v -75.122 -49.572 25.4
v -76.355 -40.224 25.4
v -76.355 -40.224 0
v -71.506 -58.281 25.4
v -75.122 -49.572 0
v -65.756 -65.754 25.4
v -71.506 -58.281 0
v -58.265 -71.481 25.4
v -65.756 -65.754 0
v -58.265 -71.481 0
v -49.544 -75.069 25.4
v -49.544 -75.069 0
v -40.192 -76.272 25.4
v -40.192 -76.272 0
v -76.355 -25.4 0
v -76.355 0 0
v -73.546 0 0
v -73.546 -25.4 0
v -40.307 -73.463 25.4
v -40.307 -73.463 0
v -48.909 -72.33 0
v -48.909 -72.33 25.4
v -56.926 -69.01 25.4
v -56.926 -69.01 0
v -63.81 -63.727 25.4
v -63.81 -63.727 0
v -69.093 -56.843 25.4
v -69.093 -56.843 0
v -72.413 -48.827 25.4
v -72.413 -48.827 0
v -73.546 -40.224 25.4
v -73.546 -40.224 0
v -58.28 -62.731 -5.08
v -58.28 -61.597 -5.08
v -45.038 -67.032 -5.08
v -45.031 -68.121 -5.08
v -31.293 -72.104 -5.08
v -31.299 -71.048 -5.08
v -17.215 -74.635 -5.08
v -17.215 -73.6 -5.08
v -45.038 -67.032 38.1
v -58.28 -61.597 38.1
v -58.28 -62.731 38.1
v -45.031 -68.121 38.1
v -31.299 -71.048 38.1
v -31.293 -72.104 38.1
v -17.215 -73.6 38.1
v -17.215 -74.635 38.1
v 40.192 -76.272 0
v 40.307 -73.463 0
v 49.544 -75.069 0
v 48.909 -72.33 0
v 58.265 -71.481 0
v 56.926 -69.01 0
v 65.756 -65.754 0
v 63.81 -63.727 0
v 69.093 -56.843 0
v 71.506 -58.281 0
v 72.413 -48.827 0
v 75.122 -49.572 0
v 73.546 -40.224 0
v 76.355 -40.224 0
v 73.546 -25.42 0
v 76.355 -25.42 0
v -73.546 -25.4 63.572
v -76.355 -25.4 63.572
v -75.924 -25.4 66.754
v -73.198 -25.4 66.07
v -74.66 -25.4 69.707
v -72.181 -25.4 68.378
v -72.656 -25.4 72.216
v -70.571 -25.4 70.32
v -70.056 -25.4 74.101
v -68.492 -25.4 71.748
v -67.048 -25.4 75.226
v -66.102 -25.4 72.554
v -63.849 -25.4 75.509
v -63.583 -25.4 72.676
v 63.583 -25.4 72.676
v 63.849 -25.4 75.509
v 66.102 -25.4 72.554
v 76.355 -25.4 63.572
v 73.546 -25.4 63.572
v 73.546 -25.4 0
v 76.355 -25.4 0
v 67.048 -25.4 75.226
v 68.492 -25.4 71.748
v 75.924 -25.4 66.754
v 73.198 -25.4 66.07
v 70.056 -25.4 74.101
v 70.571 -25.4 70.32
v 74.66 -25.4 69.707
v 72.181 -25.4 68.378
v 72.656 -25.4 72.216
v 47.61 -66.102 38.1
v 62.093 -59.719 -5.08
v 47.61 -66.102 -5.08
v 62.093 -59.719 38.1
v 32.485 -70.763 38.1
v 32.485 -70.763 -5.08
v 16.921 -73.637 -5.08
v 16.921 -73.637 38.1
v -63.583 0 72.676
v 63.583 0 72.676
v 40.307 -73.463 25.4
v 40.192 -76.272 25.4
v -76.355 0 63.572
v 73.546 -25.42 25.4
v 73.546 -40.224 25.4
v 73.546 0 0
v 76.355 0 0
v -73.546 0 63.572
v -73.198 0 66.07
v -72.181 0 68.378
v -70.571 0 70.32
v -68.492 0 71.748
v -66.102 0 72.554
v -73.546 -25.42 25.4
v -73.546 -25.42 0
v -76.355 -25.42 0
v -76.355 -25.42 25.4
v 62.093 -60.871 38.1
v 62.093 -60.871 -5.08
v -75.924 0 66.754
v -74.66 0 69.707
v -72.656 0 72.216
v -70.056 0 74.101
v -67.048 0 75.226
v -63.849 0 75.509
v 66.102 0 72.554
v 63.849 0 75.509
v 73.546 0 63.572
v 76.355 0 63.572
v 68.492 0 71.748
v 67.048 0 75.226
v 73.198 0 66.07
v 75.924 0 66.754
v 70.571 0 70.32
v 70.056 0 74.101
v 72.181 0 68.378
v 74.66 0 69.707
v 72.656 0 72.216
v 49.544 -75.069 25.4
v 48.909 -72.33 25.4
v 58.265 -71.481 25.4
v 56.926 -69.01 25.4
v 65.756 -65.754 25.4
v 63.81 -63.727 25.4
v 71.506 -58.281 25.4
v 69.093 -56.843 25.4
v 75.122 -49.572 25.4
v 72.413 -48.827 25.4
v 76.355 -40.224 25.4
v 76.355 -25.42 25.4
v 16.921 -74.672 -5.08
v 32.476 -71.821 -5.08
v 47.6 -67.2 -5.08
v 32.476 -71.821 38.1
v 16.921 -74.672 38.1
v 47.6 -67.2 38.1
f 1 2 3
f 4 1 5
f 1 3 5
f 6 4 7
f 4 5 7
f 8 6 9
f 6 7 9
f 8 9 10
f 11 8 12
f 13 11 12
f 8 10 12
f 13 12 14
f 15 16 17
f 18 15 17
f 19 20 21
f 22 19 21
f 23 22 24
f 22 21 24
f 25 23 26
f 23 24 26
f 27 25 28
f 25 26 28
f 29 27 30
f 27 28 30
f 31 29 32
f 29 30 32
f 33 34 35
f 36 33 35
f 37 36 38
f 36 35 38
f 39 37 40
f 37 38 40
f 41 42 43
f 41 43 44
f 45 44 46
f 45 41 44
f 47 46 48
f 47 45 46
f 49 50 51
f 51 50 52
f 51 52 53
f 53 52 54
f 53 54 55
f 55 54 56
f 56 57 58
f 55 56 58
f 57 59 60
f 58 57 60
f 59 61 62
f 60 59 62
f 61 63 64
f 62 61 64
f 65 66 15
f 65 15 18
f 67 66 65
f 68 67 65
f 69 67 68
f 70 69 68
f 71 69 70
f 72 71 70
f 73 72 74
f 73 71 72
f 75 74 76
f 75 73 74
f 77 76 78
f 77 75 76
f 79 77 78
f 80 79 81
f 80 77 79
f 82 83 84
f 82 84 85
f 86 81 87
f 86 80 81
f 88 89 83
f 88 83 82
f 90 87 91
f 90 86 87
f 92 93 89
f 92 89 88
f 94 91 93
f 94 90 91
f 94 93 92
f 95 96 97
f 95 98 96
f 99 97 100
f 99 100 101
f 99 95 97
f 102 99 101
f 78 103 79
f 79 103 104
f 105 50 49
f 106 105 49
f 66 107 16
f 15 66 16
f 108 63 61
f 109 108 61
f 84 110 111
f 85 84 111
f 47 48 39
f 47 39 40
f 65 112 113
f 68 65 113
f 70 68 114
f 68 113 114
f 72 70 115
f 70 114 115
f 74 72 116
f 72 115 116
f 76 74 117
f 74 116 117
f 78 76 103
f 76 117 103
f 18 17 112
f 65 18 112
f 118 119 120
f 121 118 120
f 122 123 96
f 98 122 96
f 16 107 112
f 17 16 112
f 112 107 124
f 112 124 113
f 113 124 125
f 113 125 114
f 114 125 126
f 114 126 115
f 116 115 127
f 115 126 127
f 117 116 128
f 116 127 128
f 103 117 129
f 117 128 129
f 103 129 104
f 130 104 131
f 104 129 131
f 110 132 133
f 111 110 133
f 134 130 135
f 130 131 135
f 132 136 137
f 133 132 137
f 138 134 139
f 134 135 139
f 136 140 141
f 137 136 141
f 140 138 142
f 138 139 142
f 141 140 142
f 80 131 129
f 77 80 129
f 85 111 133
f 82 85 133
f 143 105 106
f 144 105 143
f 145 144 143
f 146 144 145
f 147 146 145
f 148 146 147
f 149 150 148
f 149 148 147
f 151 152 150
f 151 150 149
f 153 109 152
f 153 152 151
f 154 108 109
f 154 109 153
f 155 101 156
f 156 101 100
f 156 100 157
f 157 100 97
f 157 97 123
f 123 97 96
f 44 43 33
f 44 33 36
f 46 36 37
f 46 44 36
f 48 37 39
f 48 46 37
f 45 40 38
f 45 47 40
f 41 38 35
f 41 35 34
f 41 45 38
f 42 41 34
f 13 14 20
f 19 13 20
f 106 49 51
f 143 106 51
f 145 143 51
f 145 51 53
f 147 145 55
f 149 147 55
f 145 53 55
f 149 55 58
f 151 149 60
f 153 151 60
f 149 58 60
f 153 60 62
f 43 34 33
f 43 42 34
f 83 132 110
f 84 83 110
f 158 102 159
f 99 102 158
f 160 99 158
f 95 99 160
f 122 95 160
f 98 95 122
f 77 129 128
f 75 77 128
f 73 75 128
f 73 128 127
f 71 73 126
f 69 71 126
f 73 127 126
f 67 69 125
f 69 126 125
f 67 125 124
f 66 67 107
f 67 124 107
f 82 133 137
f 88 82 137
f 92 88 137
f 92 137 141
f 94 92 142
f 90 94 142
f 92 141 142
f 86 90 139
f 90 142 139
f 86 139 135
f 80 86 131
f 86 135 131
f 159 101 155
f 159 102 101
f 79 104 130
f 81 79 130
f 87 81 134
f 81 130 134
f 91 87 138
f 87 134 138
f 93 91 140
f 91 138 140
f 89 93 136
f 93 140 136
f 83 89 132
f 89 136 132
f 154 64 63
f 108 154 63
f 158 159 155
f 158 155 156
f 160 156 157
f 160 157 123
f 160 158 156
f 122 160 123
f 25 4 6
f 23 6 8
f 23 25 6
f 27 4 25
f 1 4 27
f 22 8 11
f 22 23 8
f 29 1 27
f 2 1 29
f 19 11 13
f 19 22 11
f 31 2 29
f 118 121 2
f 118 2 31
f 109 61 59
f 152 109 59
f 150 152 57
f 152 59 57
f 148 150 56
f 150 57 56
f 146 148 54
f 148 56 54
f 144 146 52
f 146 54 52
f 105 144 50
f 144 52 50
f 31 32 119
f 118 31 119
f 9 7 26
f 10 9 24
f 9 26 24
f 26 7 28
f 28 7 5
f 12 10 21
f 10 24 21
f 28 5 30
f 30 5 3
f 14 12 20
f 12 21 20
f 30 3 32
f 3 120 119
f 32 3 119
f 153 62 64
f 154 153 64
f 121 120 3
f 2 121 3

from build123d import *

# Parameters (mm, degrees)
F2_DEPTH      = 25.4
F3_DEPTH      = 25.4
F5_DEPTH      = 38.1
F5_DEPTH_BACK = 5.08


with BuildPart() as f2:
    # F0 (on Front) → F2 (new body)
    with BuildSketch(Plane.XZ):
        with BuildLine():
            Line((-76.355159, 63.57199), (-76.355159, 0))
            Line((-76.355159, 0), (-73.545843, 0))
            Line((-73.545843, 0), (-73.545843, 63.57199))
            ThreePointArc((-73.545843, 63.57199), (-70.571152, 70.319842), (-63.58318, 72.675802))
            Line((-63.58318, 72.675802), (63.58318, 72.675802))
            ThreePointArc((63.58318, 72.675802), (70.571152, 70.319842), (73.545843, 63.57199))
            Line((73.545843, 63.57199), (73.545843, 0))
            Line((73.545843, 0), (76.355159, 0))
            Line((76.355159, 0), (76.355159, 63.57199))
            ThreePointArc((76.355159, 63.57199), (72.656299, 72.216194), (63.849493, 75.509218))
            Line((63.849493, 75.509218), (-63.849493, 75.509218))
            ThreePointArc((-63.849493, 75.509218), (-72.656299, 72.216194), (-76.355159, 63.57199))
        make_face()
    extrude(amount=F2_DEPTH)


with BuildPart() as f3:
    # F1 (on Top) → F3 (new body)
    with BuildSketch(Plane.XY):
        with BuildLine():
            Line((76.355159, -25.419576), (73.545843, -25.419576))
            Line((73.545843, -25.419576), (73.545843, -40.22374))
            ThreePointArc((73.545843, -40.22374), (63.810273, -63.727486), (40.306527, -73.463056))
            Line((40.306527, -73.463056), (40.192119, -76.272191))
            ThreePointArc((40.192119, -76.272191), (65.756278, -65.75439), (76.355159, -40.22374))
            Line((76.355159, -40.22374), (76.355159, -25.419576))
        make_face()
        with BuildLine():
            Line((-73.545843, -25.419576), (-76.355159, -25.419576))
            Line((-76.355159, -25.419576), (-76.355159, -40.22374))
            ThreePointArc((-76.355159, -40.22374), (-65.756278, -65.75439), (-40.192119, -76.272191))
            Line((-40.192119, -76.272191), (-40.306527, -73.463056))
            ThreePointArc((-40.306527, -73.463056), (-63.810273, -63.727486), (-73.545843, -40.22374))
            Line((-73.545843, -40.22374), (-73.545843, -25.419576))
        make_face()
    extrude(amount=F3_DEPTH)


with BuildPart() as f5:
    # F4 (on Top) → F5 (new body, two sides)
    with BuildSketch(Plane.XY) as f5_sk:
        with BuildLine():
            Line((16.920835, -73.637406), (16.920835, -74.671656))
            ThreePointArc((16.920835, -74.671656), (40.104947, -69.728819), (62.092822, -60.870601))
            Line((62.092822, -60.870601), (62.092822, -59.718692))
            ThreePointArc((62.092822, -59.718692), (40.115111, -68.652178), (16.920835, -73.637406))
        make_face()
        with BuildLine():
            Line((-58.280259, -61.596542), (-58.280259, -62.731045))
            ThreePointArc((-58.280259, -62.731045), (-38.213891, -70.291751), (-17.214814, -74.634814))
            Line((-17.214814, -74.634814), (-17.214814, -73.600281))
            ThreePointArc((-17.214814, -73.600281), (-38.221708, -69.220578), (-58.280259, -61.596542))
        make_face()
    extrude(amount=F5_DEPTH)
    extrude(f5_sk.sketch, amount=-F5_DEPTH_BACK)


solid = Compound([f2.part, f3.part, f5.part])
